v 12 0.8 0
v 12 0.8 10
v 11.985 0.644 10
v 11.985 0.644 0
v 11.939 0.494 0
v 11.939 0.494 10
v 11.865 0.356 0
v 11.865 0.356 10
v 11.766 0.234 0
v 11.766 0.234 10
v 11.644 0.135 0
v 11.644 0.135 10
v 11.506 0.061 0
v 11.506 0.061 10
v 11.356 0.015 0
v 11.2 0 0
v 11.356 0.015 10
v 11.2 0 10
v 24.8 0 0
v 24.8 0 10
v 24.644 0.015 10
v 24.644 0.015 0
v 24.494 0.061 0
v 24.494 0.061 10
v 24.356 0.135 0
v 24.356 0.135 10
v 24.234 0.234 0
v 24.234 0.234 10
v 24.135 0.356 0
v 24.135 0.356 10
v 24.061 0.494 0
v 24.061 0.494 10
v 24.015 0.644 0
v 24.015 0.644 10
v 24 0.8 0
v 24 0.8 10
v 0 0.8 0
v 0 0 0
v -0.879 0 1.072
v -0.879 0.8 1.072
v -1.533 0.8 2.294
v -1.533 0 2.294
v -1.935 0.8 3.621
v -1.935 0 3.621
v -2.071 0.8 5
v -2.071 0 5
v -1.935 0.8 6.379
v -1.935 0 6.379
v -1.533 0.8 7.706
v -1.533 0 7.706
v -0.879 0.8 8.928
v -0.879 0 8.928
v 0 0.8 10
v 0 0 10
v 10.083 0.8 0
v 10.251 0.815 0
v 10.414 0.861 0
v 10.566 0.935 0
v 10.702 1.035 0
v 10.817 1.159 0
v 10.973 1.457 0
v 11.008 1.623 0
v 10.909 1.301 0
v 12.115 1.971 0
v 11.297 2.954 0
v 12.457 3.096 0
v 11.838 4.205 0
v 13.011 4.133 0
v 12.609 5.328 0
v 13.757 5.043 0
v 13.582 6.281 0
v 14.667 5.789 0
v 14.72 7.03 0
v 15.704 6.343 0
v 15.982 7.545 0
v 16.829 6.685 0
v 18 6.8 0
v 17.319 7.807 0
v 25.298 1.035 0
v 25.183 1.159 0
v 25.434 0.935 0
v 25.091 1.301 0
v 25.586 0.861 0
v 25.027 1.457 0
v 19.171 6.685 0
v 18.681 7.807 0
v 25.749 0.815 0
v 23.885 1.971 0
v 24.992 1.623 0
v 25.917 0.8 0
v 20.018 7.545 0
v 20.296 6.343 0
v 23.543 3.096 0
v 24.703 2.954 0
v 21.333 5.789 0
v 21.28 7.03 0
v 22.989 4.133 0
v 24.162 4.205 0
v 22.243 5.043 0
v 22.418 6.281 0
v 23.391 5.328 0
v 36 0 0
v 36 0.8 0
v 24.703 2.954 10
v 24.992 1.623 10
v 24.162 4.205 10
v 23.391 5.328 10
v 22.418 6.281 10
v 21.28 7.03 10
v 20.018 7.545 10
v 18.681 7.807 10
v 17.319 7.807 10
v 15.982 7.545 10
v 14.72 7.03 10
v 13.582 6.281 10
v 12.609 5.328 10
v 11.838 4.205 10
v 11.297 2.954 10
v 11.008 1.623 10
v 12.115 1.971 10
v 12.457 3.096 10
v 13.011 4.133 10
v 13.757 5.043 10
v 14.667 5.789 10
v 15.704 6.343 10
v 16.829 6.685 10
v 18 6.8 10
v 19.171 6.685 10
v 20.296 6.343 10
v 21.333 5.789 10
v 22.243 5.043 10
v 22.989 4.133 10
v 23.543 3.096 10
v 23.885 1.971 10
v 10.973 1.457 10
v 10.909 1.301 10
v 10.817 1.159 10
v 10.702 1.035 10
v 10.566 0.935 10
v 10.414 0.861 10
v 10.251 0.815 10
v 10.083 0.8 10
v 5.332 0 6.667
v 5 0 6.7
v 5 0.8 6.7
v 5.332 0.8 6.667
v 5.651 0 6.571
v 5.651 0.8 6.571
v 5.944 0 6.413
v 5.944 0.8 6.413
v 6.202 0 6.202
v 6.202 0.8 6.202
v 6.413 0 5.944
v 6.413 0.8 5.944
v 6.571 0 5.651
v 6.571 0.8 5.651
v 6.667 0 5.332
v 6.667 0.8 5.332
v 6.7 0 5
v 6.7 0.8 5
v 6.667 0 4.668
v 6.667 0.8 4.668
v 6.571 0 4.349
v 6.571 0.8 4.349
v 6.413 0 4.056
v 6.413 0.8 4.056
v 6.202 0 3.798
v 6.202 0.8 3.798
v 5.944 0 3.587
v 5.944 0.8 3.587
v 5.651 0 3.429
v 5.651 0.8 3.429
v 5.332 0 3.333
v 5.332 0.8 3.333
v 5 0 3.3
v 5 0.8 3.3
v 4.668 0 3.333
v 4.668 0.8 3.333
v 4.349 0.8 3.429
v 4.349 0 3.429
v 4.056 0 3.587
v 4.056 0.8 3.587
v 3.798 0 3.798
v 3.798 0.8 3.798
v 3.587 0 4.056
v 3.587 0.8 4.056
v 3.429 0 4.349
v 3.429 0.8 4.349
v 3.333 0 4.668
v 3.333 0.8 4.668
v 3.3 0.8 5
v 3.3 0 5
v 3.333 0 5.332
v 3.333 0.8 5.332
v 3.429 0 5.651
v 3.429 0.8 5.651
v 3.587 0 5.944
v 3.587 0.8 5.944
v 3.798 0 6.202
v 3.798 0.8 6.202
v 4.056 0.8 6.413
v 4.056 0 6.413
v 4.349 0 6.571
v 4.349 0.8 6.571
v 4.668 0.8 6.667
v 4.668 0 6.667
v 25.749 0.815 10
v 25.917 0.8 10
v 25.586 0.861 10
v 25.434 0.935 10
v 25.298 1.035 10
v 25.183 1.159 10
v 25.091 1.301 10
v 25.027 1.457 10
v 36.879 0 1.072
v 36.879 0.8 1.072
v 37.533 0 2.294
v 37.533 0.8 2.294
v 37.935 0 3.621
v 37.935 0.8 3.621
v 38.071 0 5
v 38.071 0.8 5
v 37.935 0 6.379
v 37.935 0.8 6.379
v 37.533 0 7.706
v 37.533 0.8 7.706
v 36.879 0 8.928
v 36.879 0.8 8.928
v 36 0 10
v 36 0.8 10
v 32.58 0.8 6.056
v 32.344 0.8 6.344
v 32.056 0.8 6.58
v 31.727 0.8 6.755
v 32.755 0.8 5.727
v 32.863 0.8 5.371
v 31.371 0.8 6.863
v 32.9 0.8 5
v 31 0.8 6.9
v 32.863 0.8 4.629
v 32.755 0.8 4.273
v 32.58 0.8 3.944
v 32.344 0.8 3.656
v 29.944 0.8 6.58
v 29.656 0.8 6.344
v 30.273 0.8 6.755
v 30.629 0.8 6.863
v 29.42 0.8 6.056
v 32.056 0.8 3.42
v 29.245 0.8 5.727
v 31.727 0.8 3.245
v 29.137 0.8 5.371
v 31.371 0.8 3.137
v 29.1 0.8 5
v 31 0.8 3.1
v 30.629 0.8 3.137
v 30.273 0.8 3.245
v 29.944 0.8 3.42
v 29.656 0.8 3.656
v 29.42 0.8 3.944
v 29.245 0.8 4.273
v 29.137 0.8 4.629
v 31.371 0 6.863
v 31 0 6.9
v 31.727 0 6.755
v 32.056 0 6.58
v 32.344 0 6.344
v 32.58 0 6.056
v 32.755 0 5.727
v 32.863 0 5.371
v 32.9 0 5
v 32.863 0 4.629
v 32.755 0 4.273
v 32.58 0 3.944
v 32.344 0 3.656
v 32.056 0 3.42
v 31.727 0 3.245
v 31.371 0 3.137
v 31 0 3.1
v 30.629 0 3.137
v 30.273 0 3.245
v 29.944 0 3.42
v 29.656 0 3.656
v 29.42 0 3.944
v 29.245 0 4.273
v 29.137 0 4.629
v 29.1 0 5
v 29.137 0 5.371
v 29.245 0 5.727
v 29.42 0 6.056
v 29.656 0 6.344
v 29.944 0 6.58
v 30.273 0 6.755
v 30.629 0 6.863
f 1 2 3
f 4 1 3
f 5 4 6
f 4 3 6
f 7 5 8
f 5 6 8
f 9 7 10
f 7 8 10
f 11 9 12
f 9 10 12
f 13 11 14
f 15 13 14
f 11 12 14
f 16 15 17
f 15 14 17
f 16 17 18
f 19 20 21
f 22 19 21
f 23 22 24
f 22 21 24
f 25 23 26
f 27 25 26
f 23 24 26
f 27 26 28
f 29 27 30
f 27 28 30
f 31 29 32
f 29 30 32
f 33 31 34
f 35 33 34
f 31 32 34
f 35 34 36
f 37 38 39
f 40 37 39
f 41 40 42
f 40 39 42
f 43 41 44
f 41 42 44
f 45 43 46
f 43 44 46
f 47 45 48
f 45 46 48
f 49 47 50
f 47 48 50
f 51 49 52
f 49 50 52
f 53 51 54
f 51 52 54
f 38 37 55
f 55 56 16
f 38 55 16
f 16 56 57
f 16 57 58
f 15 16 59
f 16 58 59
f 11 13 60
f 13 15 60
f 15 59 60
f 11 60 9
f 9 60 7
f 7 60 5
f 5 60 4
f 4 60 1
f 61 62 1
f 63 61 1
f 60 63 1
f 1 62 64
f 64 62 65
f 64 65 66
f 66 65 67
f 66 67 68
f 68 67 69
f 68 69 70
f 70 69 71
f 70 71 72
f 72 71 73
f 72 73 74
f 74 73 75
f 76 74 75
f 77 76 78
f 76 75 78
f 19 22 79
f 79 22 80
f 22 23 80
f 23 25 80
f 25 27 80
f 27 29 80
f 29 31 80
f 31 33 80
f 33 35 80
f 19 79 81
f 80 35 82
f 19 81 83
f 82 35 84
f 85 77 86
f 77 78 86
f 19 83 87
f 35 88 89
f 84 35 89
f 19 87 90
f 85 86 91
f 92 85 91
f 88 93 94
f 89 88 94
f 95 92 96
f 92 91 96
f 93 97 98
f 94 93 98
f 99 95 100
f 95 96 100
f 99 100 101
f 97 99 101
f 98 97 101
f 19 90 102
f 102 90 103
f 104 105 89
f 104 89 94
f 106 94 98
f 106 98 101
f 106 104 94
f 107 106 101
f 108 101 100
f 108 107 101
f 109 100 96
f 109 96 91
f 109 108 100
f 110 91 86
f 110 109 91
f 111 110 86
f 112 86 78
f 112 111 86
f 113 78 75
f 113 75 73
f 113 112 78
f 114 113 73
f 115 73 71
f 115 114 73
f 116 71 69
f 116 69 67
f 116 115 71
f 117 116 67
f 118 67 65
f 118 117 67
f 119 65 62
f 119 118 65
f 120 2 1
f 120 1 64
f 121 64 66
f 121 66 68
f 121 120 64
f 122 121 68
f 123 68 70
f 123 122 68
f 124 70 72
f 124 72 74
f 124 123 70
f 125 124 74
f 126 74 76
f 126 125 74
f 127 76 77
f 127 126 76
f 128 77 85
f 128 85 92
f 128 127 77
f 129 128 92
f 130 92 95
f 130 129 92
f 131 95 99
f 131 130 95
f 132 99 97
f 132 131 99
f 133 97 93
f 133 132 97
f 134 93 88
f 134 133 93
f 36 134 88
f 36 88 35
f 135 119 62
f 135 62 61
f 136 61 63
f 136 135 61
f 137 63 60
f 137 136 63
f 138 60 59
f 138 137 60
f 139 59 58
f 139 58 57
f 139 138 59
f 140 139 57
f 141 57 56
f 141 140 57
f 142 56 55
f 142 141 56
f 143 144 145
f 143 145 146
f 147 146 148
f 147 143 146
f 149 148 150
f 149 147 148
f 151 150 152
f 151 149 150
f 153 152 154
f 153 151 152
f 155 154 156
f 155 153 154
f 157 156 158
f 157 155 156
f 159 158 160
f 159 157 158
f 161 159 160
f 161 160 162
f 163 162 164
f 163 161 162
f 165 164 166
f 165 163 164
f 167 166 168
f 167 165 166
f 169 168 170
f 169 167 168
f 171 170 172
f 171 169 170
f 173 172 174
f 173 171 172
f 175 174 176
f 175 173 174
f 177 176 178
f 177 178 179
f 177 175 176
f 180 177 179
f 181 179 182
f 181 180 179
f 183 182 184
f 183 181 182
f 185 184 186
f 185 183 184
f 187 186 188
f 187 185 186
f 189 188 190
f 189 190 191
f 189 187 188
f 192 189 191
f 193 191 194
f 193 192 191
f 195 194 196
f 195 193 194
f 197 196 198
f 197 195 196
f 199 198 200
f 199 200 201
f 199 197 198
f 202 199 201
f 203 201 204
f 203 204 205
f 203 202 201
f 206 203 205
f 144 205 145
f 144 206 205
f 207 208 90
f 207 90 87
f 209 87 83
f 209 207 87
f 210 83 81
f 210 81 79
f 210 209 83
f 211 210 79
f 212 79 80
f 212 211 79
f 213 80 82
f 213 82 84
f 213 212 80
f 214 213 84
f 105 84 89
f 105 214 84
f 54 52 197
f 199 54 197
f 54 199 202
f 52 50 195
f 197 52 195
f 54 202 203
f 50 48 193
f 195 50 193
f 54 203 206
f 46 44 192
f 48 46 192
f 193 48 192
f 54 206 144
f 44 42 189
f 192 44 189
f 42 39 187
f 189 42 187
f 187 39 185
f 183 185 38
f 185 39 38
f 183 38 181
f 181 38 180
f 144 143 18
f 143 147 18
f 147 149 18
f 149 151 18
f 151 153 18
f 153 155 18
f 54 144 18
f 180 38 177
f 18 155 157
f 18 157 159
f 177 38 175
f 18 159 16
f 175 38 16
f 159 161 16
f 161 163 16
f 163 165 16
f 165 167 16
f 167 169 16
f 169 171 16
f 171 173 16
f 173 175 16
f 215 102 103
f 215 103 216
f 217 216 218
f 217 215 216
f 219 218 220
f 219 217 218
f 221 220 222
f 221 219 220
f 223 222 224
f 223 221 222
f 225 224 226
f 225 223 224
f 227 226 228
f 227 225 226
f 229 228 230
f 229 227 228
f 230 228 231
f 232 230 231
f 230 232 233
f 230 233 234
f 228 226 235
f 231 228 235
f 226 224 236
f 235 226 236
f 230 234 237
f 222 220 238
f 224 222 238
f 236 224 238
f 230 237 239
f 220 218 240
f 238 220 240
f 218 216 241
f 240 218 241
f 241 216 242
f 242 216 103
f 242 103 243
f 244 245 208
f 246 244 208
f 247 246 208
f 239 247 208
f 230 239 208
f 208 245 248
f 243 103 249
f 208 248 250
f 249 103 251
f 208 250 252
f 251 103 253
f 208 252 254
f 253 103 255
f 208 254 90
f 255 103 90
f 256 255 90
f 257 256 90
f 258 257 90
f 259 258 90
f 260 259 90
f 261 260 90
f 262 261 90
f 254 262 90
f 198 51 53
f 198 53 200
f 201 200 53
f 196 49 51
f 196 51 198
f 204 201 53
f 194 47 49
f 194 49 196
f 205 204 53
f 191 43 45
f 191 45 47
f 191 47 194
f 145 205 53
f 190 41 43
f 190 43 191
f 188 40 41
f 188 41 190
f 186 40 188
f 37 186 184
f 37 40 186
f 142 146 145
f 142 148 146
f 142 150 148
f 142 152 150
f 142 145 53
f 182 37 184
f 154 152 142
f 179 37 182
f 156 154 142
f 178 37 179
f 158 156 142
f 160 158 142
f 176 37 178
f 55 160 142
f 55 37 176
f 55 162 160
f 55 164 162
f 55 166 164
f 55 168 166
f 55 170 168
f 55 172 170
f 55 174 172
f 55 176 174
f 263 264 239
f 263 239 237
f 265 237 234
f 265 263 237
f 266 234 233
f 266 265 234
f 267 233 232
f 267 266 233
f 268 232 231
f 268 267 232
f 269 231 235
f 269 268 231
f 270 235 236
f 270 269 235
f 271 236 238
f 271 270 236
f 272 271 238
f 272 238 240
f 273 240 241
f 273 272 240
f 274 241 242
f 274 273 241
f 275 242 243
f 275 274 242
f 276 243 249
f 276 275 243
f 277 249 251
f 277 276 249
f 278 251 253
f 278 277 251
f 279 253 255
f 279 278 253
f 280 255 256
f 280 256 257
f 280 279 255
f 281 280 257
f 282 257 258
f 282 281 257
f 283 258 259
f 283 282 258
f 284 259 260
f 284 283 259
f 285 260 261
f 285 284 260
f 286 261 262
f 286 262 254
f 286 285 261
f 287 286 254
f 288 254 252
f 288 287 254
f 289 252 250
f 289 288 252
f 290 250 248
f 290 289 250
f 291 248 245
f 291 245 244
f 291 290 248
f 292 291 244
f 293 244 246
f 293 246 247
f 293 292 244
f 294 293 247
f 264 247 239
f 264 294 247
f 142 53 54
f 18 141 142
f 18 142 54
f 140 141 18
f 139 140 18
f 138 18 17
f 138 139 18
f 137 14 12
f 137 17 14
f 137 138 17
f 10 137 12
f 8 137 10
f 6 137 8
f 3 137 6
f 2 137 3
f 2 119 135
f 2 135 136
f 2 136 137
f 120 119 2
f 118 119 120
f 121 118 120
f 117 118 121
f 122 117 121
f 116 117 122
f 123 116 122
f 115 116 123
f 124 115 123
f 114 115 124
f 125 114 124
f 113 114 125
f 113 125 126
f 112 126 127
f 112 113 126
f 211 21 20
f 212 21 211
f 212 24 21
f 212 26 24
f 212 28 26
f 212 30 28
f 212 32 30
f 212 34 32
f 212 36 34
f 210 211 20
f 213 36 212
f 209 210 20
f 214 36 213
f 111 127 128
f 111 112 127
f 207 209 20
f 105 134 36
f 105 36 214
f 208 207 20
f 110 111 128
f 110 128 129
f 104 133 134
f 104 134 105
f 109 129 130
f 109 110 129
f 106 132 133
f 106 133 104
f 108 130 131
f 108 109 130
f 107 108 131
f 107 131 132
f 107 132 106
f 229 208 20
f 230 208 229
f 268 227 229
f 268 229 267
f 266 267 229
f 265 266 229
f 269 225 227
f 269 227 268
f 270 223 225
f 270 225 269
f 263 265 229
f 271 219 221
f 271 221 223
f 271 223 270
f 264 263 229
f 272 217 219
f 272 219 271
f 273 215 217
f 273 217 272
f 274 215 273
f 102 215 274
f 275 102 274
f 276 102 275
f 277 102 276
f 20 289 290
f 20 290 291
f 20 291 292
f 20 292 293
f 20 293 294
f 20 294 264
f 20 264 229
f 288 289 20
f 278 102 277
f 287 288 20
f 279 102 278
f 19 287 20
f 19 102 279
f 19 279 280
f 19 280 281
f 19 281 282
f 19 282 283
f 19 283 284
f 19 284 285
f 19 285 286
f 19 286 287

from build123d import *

# Parameters (mm, degrees)
SKETCH_1_R          = 1.7
EXTRUDE_1_DEPTH     = 0.8
SKETCH_1_R_2        = 1.9
EXTRUDE_1_2_DEPTH   = 0.8
EXTRUDE_5_DEPTH     = 10
CUT_EXTRUDE_3_DEPTH = 10
CUT_EXTRUDE_4_DEPTH = 10


with BuildPart() as part:
    # 草图1 → 凸台-拉伸1 (new body)
    with BuildSketch(Plane(origin=(0, 0, 0), x_dir=(1, 0, 0), z_dir=(0, 1, 0))):
        with BuildLine():
            Line((0, -10), (12, -10))
            Line((12, -10), (12, 0))
            Line((12, 0), (0, 0))
            ThreePointArc((0, 0), (-2.071067812, -5), (0, -10))
        make_face()
        with Locations(Location((5, -5, 0), (0, 0, 270))):
            Circle(SKETCH_1_R, mode=Mode.SUBTRACT)
    extrude(amount=EXTRUDE_1_DEPTH)



with BuildPart() as body_2:
    # 草图1 → Extrude 1 2 (new body)
    with BuildSketch(Plane(origin=(0, 0, 0), x_dir=(1, 0, 0), z_dir=(0, 1, 0))):
        with BuildLine():
            Line((24, -10), (24, 0))
            Line((24, 0), (36, 0))
            ThreePointArc((36, 0), (38.071067812, -5), (36, -10))
            Line((36, -10), (24, -10))
        make_face()
        with Locations(Location((31, -5, 0), (0, 0, 270))):
            Circle(SKETCH_1_R_2, mode=Mode.SUBTRACT)
    extrude(amount=EXTRUDE_1_2_DEPTH)


with BuildPart() as part_1:
    add(part.part)

    add(body_2.part)  # 凸台-拉伸5 merges body 2
    # 草图2 → 凸台-拉伸5 (add)
    with BuildSketch(Plane.XY.offset(10)):
        with BuildLine():
            ThreePointArc((11.007949102, 1.622594223), (10.70184983, 1.035393399), (10.082905956, 0.8))
            Line((10.082905956, 0.8), (12, 0.8))
            ThreePointArc((12, 0.8), (18, 6.8), (24, 0.8))
            Line((24, 0.8), (25.917094044, 0.8))
            ThreePointArc((25.917094044, 0.8), (25.29815017, 1.035393399), (24.992050898, 1.622594223))
            ThreePointArc((24.992050898, 1.622594223), (18, 7.84027251), (11.007949102, 1.622594223))
        make_face()
    extrude(amount=-EXTRUDE_5_DEPTH)

    # 草图3 → 切除-拉伸3 (cut)
    with BuildSketch(Plane.XY.offset(10)):
        with BuildLine():
            Line((11.2, 0), (12, 0))
            Line((12, 0), (12, 0.8))
            ThreePointArc((12, 0.8), (11.765685425, 0.234314575), (11.2, 0))
        make_face()
    extrude(amount=-CUT_EXTRUDE_3_DEPTH, mode=Mode.SUBTRACT)

    # 草图4 → 切除-拉伸4 (cut)
    with BuildSketch(Plane.XY.offset(10)):
        with BuildLine():
            Line((24, 0.8), (24, 0))
            Line((24, 0), (24.8, 0))
            ThreePointArc((24.8, 0), (24.234314575, 0.234314575), (24, 0.8))
        make_face()
    extrude(amount=-CUT_EXTRUDE_4_DEPTH, mode=Mode.SUBTRACT)


solid = part_1.part
